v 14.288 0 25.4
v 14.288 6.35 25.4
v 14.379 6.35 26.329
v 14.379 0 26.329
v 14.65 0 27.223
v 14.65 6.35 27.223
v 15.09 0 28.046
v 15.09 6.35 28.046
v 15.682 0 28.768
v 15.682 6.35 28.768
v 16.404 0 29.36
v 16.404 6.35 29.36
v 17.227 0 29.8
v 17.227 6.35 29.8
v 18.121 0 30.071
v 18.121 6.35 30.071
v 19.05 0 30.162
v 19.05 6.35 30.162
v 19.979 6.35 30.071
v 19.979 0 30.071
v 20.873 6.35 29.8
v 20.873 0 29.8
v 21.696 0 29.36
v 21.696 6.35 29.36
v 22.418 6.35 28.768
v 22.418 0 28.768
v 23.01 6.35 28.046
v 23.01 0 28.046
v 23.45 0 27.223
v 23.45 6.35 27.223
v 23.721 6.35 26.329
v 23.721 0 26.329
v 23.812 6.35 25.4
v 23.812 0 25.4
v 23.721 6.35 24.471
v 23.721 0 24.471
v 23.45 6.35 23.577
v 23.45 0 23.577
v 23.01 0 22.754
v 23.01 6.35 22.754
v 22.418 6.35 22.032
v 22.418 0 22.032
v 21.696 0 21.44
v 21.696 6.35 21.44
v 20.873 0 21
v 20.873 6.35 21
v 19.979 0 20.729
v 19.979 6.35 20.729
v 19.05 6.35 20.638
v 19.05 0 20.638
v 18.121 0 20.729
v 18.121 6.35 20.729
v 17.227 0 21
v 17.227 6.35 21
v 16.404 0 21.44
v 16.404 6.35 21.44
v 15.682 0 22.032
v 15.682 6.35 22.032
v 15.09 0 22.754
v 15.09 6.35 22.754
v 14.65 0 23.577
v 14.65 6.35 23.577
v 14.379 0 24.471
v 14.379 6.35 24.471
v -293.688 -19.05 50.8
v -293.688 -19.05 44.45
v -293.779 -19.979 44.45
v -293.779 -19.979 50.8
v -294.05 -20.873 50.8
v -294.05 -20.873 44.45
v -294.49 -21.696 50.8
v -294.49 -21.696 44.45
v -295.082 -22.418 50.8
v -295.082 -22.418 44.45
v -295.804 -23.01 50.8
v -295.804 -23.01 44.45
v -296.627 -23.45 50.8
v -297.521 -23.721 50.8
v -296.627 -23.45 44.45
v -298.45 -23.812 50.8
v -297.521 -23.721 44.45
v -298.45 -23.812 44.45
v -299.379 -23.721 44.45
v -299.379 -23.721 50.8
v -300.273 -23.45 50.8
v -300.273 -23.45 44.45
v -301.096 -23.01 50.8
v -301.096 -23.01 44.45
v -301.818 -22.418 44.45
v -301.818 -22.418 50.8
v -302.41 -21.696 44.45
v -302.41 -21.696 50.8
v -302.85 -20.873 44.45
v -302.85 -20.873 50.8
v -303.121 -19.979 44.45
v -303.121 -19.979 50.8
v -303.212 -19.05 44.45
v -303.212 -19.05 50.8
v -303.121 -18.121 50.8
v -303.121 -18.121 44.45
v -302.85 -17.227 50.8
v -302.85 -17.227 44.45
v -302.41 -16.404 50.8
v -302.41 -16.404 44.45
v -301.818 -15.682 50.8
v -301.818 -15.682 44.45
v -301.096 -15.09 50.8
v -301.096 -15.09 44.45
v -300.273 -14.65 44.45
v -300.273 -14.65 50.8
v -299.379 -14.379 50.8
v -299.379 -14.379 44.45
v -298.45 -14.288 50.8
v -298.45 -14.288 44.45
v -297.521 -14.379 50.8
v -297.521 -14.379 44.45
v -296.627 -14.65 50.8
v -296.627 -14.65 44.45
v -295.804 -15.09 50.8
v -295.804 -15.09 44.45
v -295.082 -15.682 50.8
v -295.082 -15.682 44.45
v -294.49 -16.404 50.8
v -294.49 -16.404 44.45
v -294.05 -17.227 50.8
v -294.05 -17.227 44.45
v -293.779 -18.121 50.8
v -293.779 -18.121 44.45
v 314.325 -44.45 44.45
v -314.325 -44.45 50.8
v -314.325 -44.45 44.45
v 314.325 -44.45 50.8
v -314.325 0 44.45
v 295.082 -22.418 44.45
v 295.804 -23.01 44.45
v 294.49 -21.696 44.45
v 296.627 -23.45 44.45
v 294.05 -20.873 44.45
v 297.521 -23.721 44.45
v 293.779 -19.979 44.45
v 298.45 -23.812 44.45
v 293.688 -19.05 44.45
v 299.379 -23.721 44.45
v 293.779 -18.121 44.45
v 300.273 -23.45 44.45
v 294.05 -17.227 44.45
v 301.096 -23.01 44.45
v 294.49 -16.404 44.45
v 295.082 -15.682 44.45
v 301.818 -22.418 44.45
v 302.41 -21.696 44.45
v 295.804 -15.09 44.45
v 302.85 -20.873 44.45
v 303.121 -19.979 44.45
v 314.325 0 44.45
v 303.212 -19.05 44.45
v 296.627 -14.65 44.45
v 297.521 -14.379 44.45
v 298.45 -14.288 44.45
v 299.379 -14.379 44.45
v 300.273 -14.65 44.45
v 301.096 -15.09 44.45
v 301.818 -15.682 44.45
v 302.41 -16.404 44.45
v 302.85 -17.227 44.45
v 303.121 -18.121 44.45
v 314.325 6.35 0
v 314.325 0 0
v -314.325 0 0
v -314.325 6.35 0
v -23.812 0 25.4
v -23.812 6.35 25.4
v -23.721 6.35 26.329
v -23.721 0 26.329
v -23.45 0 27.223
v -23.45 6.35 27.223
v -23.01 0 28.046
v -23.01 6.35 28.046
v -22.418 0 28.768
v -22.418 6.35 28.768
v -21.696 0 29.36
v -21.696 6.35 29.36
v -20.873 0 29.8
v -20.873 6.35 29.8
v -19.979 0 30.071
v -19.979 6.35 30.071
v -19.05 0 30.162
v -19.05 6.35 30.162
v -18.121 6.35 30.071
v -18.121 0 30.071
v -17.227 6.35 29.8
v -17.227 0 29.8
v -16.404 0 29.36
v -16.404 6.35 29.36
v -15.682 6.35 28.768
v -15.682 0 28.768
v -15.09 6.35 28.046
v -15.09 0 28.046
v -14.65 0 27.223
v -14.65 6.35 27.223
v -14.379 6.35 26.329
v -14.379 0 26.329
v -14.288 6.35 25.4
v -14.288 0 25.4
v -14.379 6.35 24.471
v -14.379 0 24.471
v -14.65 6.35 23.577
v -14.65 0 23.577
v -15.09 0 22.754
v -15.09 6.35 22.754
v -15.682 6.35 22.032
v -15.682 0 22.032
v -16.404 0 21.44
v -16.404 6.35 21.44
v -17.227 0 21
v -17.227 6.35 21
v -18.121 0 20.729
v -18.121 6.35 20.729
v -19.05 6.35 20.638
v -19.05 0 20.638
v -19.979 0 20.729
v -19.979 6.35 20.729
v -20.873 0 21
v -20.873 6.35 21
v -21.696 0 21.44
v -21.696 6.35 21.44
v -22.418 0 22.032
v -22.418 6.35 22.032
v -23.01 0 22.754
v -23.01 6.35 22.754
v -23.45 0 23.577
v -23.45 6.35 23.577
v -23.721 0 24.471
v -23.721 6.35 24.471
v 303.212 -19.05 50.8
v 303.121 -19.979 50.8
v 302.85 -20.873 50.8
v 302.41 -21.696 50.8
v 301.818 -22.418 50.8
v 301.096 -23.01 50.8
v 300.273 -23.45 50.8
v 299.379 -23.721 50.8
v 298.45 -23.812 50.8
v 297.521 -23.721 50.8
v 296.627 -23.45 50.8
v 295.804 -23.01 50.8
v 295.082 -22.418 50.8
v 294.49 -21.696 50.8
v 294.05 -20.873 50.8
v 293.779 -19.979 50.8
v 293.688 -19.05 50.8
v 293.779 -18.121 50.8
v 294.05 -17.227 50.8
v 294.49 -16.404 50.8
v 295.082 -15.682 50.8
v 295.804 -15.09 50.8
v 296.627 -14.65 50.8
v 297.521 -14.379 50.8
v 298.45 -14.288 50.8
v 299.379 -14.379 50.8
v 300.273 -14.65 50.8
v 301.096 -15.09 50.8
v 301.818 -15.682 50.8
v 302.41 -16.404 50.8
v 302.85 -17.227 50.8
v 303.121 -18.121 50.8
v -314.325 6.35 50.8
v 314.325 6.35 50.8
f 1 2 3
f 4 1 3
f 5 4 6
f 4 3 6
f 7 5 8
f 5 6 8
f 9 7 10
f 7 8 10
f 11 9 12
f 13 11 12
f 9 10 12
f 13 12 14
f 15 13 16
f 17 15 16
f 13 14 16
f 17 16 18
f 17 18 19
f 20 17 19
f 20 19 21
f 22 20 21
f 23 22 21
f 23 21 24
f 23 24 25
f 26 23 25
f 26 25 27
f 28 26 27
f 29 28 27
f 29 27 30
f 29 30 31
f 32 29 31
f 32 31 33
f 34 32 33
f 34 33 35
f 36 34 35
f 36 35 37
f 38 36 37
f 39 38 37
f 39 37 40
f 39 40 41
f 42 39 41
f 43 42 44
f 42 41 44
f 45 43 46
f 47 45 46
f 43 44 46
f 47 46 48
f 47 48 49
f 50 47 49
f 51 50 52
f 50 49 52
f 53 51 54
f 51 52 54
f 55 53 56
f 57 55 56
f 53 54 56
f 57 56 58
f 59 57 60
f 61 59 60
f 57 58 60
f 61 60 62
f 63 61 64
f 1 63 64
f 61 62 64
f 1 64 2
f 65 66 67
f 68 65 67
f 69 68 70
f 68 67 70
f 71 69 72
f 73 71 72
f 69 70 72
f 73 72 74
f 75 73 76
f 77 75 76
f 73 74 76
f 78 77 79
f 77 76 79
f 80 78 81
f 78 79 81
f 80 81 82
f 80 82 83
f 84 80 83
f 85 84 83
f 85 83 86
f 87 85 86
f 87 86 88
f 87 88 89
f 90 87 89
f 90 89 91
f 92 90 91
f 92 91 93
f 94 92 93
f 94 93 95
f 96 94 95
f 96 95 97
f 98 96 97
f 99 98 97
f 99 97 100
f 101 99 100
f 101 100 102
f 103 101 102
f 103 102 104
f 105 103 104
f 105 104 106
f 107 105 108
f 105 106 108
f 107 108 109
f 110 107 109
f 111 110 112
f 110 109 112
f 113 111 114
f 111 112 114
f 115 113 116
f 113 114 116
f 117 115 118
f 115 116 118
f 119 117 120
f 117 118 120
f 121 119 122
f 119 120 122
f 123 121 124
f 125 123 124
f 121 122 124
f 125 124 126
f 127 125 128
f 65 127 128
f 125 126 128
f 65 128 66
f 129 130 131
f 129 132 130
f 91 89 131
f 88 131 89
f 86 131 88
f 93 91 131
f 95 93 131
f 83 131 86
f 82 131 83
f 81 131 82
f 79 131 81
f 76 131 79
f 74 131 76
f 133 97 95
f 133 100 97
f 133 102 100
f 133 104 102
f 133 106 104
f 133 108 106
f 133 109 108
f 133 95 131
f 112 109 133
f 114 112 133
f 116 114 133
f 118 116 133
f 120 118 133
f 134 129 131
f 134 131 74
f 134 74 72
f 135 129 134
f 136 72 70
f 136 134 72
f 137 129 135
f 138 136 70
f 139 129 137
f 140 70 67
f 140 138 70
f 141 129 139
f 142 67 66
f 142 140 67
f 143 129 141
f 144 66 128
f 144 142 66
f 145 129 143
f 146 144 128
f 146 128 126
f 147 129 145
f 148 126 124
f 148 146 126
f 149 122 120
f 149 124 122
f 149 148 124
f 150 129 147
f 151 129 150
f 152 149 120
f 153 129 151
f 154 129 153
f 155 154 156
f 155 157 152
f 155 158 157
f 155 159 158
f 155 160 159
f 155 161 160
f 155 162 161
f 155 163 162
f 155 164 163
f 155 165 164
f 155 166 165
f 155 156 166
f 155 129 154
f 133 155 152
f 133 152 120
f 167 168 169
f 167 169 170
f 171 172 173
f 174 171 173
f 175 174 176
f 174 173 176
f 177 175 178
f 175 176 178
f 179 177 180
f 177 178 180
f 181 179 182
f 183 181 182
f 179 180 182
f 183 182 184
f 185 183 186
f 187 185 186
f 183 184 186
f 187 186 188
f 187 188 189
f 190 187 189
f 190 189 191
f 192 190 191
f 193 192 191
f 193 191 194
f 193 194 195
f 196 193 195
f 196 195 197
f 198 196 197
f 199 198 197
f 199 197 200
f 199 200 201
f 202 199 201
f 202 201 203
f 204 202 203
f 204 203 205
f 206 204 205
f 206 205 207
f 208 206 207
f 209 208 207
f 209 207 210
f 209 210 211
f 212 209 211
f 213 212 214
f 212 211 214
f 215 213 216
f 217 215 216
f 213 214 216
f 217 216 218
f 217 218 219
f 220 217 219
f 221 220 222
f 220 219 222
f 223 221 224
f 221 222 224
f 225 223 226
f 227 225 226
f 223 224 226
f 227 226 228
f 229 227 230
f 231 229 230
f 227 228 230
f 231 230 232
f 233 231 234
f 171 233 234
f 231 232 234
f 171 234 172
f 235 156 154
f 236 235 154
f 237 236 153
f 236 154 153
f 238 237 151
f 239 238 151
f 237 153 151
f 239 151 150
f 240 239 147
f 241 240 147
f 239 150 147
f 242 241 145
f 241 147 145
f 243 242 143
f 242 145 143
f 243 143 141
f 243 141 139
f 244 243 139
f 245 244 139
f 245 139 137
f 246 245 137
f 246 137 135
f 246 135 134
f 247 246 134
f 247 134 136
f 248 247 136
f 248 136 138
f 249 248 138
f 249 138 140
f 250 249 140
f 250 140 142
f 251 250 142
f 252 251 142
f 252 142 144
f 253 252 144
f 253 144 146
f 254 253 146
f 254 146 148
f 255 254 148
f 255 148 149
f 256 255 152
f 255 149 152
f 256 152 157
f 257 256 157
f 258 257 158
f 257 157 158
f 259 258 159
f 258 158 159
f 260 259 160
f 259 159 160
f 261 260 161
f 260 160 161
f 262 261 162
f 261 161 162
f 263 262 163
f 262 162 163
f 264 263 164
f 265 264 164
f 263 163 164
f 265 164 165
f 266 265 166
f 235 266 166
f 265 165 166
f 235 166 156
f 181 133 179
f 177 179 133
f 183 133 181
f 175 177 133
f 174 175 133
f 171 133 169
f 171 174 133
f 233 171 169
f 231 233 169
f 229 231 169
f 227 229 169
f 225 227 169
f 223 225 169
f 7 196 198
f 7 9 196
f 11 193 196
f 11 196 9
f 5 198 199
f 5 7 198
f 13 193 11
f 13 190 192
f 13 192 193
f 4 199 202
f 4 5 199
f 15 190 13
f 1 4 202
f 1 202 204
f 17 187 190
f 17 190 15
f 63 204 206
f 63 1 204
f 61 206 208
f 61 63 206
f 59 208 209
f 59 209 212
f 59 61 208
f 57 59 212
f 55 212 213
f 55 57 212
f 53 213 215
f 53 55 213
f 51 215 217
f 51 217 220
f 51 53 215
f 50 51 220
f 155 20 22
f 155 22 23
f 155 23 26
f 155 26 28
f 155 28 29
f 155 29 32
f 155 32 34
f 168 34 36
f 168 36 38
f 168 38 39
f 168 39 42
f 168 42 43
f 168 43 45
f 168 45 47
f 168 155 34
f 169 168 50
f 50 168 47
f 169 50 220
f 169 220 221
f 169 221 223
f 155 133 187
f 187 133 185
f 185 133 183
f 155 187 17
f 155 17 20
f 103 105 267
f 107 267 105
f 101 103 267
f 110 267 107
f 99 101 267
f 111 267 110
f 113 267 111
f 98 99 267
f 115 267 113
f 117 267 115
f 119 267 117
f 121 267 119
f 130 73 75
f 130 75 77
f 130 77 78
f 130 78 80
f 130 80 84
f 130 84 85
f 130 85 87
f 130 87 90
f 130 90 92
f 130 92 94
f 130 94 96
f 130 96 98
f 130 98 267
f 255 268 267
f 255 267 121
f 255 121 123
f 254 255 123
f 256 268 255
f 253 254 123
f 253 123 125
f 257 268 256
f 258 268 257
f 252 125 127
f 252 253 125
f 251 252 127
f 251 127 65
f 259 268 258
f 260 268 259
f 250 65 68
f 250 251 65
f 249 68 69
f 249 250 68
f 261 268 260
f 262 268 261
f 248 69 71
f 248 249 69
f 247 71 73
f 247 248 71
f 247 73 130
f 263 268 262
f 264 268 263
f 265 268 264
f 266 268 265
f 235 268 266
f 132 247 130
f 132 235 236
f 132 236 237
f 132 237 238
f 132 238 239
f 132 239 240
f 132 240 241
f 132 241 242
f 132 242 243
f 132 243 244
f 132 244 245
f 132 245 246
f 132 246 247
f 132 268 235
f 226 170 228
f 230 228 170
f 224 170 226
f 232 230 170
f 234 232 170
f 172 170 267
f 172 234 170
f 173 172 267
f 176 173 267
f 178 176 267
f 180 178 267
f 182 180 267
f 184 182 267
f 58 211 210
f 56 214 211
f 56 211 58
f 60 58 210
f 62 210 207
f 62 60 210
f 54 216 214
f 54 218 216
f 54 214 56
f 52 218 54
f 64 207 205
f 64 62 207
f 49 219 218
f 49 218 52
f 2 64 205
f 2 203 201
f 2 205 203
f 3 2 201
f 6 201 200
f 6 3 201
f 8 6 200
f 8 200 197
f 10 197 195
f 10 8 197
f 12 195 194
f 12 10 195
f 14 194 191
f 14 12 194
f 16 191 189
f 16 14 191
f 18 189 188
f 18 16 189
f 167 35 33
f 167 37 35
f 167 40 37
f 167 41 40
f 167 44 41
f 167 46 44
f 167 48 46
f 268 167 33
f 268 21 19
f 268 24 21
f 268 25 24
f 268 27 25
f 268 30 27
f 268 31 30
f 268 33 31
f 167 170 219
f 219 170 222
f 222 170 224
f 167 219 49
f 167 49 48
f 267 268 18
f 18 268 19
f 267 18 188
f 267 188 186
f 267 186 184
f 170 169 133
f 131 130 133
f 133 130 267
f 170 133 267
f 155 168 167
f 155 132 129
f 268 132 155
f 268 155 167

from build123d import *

# Parameters (mm, degrees)
F1_DEPTH = 314.325
F2_R     = 4.7625
F3_DEPTH = 50.801
F4_R     = 4.7625
F5_DEPTH = 6.351


with BuildPart() as f1:
    # F0 (on Right) → F1 (new body, symmetric)
    with BuildSketch(Plane.YZ):
        Polygon((0, 44.45), (0, 0), (6.35, 0), (6.35, 50.8), (-44.45, 50.8), (-44.45, 44.45), align=None)
    extrude(amount=F1_DEPTH, both=True)

    # F2 (on face) → F3 (cut, through all)
    with BuildSketch(Plane(origin=(0, 6.35, 0), x_dir=(-1, 0, 0), z_dir=(0, 1, 0))):
        with Locations((-19.05, 25.4)):
            Circle(F2_R)
        with Locations((19.05, 25.4)):
            Circle(F2_R)
    extrude(amount=-F3_DEPTH, mode=Mode.SUBTRACT)

    # F4 (on face) → F5 (cut, through all)
    with BuildSketch(Plane(origin=(0, 0, 44.45), x_dir=(1, 0, 0), z_dir=(0, 0, -1))):
        with Locations((-298.45, 19.05)):
            Circle(F4_R)
        with Locations((298.45, 19.05)):
            Circle(F4_R)
    extrude(amount=-F5_DEPTH, mode=Mode.SUBTRACT)


solid = f1.part
